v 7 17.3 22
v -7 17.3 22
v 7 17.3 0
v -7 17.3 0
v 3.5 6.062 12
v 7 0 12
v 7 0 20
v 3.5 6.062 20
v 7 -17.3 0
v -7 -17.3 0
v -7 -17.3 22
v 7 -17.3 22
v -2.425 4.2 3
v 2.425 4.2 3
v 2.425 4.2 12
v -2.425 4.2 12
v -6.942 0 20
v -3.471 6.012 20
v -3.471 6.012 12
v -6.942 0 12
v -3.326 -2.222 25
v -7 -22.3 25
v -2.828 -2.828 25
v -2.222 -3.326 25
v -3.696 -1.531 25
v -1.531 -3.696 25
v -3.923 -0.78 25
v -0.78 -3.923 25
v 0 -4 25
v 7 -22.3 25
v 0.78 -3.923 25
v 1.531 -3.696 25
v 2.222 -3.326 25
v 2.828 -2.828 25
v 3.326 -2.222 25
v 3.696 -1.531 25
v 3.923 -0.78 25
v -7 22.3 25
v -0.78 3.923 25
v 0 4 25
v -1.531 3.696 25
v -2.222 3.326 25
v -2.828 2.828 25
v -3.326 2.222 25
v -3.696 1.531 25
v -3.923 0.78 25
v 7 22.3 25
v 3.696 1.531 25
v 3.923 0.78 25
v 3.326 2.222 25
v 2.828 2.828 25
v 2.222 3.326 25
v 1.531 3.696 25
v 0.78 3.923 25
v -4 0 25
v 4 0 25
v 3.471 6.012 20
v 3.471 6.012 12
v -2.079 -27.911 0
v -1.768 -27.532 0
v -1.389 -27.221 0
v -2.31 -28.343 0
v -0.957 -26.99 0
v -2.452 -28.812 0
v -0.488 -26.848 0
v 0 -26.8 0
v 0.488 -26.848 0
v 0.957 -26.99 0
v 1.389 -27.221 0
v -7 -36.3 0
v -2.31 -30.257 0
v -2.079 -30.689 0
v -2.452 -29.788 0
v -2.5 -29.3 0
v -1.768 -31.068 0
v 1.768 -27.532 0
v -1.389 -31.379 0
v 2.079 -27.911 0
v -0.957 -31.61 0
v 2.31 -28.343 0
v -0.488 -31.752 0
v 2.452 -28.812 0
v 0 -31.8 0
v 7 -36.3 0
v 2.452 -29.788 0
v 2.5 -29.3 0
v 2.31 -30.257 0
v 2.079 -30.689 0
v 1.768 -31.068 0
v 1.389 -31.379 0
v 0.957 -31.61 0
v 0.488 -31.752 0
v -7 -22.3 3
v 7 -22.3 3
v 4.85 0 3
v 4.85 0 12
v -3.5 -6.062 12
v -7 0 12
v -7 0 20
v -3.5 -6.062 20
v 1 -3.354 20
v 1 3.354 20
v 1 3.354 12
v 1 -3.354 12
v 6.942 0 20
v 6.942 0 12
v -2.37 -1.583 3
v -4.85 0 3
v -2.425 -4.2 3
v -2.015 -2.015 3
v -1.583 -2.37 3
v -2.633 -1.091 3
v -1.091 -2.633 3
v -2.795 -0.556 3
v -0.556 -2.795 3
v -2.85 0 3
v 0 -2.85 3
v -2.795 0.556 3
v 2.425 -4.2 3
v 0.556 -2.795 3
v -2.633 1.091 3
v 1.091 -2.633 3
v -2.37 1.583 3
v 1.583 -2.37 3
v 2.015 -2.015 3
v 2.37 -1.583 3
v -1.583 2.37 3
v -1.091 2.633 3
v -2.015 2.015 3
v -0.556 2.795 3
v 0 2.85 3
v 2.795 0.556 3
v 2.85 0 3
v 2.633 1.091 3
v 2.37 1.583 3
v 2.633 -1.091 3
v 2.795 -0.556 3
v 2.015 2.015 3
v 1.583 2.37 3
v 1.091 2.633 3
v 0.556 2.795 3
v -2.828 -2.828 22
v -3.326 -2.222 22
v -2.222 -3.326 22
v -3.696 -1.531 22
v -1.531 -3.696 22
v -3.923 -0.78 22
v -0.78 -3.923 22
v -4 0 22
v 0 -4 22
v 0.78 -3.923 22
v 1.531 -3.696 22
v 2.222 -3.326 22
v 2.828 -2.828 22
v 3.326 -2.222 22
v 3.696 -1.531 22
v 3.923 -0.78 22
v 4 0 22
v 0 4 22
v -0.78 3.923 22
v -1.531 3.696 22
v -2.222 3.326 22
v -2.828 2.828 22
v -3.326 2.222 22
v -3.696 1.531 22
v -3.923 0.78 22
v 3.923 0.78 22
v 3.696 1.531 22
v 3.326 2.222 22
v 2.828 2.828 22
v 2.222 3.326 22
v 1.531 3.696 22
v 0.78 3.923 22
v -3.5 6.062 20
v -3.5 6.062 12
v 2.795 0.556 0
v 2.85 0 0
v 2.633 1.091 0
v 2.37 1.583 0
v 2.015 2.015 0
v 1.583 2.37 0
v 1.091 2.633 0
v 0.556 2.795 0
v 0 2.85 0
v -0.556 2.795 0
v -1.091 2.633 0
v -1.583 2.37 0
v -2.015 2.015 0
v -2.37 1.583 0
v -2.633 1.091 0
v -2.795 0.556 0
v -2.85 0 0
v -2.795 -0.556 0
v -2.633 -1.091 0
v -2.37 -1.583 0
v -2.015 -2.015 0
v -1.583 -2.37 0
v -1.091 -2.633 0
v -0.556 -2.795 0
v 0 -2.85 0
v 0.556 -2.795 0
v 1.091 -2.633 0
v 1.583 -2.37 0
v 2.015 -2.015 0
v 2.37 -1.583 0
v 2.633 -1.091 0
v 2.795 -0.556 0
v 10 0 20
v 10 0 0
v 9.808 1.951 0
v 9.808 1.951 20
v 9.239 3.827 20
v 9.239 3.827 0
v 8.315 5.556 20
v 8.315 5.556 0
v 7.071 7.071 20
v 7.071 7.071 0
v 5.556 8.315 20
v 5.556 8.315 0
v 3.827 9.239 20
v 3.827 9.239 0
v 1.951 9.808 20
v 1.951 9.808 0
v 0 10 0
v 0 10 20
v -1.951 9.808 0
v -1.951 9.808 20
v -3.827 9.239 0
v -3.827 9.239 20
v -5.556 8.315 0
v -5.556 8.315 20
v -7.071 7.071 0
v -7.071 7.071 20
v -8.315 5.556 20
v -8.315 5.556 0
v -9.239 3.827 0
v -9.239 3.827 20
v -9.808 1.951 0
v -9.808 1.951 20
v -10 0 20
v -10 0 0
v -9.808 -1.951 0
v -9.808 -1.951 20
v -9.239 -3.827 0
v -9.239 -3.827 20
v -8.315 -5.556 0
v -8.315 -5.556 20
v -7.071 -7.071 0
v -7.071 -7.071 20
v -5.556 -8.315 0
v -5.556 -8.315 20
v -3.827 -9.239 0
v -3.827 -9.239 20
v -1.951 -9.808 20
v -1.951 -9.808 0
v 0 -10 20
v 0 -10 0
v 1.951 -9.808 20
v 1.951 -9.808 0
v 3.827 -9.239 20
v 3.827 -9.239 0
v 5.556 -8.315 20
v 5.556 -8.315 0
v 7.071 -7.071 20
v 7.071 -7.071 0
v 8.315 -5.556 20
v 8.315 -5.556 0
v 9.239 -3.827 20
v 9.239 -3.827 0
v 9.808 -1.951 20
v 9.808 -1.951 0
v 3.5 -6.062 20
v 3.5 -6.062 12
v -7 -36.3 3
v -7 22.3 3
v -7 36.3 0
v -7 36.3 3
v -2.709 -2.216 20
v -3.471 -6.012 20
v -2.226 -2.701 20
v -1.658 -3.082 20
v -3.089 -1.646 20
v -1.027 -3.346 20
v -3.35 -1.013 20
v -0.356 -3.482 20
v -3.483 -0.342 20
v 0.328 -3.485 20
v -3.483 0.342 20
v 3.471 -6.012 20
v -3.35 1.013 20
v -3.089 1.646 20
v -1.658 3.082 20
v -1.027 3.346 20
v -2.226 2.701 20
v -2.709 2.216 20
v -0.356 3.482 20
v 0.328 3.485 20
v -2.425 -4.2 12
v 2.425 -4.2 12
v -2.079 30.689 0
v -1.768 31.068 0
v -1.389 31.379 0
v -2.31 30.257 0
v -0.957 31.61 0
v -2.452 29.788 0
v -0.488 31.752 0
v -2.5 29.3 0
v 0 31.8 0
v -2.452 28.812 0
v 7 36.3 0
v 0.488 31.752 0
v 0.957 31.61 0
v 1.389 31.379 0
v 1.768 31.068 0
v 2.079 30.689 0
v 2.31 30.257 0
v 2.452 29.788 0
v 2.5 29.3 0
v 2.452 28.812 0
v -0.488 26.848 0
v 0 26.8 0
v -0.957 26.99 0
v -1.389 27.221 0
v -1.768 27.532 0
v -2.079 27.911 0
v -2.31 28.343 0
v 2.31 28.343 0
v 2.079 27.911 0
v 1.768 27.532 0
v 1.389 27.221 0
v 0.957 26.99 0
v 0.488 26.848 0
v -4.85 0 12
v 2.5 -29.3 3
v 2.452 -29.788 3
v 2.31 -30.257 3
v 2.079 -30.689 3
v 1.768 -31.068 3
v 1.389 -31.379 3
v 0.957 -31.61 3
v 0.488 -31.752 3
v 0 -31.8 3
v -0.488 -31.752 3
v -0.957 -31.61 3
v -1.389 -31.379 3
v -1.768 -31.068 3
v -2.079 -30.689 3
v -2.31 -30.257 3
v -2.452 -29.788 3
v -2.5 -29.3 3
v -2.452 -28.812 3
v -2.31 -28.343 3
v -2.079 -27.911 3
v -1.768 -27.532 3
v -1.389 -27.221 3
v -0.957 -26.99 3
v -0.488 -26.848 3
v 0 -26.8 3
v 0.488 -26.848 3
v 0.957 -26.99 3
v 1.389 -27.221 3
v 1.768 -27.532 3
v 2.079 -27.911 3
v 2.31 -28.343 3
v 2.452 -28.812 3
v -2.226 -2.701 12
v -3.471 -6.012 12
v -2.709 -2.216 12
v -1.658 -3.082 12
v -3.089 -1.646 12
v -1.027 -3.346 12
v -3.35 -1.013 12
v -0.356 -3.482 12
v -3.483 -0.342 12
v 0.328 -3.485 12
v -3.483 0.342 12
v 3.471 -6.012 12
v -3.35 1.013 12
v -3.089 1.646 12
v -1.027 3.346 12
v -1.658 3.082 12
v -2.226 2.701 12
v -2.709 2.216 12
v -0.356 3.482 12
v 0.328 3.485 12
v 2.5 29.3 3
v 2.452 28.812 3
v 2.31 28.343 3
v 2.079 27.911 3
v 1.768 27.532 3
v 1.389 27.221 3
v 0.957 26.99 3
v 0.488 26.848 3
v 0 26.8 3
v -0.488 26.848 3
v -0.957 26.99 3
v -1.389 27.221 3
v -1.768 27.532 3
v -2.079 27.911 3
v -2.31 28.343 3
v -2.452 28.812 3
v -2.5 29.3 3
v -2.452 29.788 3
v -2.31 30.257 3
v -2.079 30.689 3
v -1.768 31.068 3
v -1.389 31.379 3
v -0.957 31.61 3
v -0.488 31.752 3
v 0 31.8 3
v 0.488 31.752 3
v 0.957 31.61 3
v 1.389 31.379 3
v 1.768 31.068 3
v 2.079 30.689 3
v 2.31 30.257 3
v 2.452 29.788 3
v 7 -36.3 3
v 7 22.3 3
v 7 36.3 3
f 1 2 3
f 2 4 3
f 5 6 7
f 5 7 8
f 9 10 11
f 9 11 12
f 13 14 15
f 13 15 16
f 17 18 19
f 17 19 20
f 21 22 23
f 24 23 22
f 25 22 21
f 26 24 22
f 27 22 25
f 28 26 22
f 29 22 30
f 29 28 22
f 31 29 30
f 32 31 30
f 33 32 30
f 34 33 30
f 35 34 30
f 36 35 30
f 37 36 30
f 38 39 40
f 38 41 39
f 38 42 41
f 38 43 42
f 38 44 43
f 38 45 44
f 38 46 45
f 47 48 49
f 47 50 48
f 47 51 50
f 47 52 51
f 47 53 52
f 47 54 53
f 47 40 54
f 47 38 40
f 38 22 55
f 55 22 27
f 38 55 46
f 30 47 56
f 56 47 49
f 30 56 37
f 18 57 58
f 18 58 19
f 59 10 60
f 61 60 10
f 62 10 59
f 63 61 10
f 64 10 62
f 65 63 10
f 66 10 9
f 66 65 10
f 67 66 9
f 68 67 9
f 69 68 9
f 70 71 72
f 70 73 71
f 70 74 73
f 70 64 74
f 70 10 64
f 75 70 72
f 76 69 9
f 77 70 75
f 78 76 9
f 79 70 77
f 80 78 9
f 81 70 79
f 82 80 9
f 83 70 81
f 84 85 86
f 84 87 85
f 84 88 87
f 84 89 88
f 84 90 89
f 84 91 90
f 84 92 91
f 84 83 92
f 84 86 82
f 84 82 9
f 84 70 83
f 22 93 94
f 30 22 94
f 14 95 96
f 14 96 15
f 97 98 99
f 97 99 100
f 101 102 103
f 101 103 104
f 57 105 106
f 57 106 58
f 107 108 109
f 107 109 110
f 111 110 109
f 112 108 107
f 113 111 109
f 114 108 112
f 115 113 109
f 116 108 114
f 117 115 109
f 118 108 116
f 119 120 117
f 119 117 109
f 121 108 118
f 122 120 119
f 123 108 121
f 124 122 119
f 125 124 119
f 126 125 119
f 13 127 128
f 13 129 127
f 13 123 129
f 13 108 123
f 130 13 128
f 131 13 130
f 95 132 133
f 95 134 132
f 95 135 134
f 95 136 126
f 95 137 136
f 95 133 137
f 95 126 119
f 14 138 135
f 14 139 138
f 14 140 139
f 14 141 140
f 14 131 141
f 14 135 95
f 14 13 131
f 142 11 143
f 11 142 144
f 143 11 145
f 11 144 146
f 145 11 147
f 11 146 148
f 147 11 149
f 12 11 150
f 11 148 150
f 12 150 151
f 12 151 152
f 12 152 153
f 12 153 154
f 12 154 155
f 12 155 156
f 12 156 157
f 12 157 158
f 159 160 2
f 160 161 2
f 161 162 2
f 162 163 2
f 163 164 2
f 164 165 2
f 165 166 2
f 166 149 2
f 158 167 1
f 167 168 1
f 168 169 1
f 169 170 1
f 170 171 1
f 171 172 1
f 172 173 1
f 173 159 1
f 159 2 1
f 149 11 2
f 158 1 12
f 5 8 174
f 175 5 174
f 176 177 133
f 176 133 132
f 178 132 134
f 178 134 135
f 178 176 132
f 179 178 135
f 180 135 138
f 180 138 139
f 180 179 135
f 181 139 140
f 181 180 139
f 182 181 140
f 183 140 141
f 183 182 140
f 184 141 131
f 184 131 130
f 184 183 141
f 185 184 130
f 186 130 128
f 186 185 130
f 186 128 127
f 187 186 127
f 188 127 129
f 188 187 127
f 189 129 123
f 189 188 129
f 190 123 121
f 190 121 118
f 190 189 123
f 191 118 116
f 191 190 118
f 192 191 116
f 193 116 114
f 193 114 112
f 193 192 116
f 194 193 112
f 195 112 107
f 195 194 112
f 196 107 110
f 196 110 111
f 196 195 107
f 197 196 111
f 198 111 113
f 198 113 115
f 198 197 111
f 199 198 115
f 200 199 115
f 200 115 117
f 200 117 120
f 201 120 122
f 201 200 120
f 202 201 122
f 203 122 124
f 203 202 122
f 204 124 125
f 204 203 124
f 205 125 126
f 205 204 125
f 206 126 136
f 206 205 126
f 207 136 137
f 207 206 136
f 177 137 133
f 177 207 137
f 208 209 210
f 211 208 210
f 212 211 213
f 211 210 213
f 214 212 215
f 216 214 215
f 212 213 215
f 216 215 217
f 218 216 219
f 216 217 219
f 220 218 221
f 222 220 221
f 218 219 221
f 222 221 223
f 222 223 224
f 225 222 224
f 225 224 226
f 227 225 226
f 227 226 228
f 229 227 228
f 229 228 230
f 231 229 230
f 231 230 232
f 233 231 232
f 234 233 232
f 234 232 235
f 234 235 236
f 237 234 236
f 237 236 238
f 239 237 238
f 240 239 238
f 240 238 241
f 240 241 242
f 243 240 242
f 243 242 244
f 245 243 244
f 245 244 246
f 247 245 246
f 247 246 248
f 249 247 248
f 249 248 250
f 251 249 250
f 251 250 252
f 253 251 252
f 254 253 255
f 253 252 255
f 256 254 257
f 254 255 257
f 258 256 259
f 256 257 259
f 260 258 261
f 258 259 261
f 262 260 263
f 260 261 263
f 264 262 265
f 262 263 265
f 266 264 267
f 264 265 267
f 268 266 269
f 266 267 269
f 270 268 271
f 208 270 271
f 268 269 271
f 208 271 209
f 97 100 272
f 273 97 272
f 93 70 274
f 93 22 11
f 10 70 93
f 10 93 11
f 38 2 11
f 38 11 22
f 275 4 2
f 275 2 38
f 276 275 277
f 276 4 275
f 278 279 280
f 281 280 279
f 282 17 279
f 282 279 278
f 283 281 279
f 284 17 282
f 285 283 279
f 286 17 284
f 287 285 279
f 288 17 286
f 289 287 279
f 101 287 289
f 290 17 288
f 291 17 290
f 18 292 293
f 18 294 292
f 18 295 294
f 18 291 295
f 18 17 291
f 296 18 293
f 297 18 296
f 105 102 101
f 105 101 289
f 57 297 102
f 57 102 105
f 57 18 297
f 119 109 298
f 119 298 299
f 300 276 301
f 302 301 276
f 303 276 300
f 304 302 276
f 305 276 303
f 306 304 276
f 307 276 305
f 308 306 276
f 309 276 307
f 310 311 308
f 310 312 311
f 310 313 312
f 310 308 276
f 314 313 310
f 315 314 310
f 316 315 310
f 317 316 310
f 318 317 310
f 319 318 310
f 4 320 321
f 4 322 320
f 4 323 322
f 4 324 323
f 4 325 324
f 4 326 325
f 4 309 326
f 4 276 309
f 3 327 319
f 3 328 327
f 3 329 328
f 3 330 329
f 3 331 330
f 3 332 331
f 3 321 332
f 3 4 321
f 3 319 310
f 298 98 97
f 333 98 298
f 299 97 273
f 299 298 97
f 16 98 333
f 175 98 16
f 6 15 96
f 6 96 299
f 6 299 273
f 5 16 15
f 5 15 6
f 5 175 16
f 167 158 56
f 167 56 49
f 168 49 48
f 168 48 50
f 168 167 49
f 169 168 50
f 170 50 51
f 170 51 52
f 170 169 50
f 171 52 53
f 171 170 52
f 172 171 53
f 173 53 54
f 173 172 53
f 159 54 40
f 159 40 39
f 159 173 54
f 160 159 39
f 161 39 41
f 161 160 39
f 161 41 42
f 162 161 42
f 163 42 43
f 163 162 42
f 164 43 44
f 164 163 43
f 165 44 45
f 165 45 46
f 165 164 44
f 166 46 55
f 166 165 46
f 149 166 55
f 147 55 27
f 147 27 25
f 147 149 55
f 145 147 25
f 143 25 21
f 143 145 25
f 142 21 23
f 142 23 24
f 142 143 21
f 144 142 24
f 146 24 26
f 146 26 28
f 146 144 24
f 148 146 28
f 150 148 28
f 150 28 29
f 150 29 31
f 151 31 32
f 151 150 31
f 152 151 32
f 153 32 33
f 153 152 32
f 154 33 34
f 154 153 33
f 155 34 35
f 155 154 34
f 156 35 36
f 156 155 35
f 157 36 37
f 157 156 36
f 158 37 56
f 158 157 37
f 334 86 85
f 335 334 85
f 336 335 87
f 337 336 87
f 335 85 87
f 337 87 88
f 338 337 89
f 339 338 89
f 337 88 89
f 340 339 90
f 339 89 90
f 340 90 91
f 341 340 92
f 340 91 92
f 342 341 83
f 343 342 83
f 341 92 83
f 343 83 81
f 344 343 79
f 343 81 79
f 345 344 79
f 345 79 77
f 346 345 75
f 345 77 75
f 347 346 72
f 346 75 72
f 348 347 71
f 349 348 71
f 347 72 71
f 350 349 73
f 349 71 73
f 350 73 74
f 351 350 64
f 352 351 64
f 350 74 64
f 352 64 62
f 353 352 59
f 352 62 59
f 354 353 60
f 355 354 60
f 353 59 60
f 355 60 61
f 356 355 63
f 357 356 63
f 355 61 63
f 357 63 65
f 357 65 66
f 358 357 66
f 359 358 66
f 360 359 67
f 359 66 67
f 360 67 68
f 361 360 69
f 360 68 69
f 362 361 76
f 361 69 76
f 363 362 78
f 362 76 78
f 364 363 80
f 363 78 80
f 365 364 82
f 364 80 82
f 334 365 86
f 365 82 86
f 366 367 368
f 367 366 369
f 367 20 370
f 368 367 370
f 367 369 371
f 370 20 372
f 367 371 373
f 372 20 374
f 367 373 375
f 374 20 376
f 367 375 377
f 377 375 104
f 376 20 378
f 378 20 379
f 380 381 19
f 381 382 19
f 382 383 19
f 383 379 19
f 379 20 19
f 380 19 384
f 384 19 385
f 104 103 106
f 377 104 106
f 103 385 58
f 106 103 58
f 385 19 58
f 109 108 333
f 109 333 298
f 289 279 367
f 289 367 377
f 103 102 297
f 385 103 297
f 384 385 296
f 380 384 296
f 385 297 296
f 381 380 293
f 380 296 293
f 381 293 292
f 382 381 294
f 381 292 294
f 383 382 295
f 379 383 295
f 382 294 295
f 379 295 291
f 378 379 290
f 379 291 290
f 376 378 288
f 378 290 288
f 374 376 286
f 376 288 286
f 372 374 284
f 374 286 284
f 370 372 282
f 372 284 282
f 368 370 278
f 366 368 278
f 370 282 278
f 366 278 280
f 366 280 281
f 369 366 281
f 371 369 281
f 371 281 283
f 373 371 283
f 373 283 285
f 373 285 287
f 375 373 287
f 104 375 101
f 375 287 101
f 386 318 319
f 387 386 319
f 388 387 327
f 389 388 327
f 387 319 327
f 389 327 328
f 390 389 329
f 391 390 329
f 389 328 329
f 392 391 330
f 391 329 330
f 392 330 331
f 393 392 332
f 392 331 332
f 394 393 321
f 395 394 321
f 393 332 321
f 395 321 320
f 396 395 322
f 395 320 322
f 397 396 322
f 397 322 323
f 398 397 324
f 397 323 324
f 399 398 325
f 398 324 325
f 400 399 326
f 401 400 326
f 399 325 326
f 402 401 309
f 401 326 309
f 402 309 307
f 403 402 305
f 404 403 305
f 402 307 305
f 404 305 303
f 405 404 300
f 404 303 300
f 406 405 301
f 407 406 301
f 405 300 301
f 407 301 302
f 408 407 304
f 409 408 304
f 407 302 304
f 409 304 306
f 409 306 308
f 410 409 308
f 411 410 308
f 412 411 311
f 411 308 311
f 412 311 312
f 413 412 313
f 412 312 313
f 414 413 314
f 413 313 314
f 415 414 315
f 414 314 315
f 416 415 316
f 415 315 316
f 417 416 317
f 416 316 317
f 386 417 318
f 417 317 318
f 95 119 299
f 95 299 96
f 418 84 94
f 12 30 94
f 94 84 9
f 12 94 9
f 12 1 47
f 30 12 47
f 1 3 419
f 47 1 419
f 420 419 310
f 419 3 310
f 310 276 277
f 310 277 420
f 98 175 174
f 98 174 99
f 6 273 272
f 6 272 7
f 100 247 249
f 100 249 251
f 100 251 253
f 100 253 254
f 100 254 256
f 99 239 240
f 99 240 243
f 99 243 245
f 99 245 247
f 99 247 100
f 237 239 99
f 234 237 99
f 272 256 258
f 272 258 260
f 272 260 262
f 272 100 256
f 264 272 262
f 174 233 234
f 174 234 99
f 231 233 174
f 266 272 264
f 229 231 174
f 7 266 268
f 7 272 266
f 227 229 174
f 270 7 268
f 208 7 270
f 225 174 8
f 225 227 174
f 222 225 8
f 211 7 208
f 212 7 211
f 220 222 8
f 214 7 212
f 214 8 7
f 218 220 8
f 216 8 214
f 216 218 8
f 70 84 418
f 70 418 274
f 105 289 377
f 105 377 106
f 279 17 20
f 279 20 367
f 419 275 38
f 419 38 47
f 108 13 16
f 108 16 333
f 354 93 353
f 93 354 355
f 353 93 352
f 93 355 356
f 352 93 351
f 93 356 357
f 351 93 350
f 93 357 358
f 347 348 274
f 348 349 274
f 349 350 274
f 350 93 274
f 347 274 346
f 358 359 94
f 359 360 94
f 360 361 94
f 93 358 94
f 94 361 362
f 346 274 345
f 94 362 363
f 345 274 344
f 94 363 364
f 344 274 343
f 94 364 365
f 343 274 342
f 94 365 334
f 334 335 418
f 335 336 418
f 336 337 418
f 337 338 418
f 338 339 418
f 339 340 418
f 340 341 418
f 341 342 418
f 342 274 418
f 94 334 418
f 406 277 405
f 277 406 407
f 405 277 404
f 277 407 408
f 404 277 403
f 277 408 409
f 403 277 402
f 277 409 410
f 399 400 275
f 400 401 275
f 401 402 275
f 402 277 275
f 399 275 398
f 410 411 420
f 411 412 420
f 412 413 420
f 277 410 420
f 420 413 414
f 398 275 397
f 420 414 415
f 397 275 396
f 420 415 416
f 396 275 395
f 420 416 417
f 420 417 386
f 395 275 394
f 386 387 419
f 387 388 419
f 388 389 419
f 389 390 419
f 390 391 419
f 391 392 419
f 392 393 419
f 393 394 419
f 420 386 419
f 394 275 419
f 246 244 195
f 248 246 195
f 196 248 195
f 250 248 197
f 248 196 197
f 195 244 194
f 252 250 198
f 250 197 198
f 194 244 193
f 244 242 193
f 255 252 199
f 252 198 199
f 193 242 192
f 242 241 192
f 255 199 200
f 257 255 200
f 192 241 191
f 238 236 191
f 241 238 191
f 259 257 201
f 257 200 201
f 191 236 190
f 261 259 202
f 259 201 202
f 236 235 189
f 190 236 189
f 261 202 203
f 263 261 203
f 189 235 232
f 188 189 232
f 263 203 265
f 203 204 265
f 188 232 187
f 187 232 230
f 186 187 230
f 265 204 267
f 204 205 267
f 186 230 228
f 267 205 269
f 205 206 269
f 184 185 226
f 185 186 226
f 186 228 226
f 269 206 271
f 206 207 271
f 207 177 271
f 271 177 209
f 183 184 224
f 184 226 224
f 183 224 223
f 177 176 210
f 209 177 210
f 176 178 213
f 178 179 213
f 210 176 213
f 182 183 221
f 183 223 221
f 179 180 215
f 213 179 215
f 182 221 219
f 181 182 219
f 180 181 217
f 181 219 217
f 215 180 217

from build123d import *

# Parameters (mm, degrees)
SKETCH004_R      = 2.5
EXTRUDE003_DEPTH = 3
SKETCH005_W      = 14
SKETCH005_H      = 5
EXTRUDE004_DEPTH = 19
SKETCH006_W      = 14
SKETCH006_H      = 44.6
SKETCH006_R      = 4
EXTRUDE005_DEPTH = 3
SKETCH001_R      = 10
EXTRUDE001_DEPTH = 9
SKETCH_R         = 10
SKETCH_R_2       = 2.85
EXTRUDE_DEPTH    = 3
SKETCH007_R      = 10
EXTRUDE006_DEPTH = 8
EXTRUDE007_DEPTH = 8


with BuildPart() as p3base:
    # Sketch004 → Extrude003 (new body)
    with BuildSketch(Plane(origin=(0, 0, 0), x_dir=(1, 0, 0), z_dir=(0, 0, -1))):
        Polygon((7, 36.3), (-7, 36.3), (-7, 22.3), (-7, 17.3), (7, 17.3), (7, 22.3), align=None)
        with Locations((0, 29.3)):
            Circle(SKETCH004_R, mode=Mode.SUBTRACT)
        Polygon((7, -36.3), (7, -22.3), (7, -17.3), (-7, -17.3), (-7, -22.3), (-7, -36.3), align=None)
        with Locations((0, -29.3)):
            Circle(SKETCH004_R, mode=Mode.SUBTRACT)
    extrude(amount=-EXTRUDE003_DEPTH)


with BuildPart() as p3walls:
    # Sketch005 (on Face17 of Extrude003) → Extrude004 (new body)
    with BuildSketch(Plane.XY.offset(3)):
        with Locations((0, 19.8)):
            Rectangle(SKETCH005_W, SKETCH005_H)
        with Locations((0, -19.8)):
            Rectangle(SKETCH005_W, SKETCH005_H)
    extrude(amount=EXTRUDE004_DEPTH)


with BuildPart() as p3:
    # Sketch006 (on Face6 of Extrude004) → Extrude005 (new body)
    with BuildSketch(Plane.XY.offset(22)):
        Rectangle(SKETCH006_W, SKETCH006_H)
        Circle(SKETCH006_R, mode=Mode.SUBTRACT)
    extrude(amount=EXTRUDE005_DEPTH)

    # Fusion001: union P3Base, P3Walls
    add(p3base.part)
    add(p3walls.part)


with BuildPart() as p1hexcylinder:
    # Sketch001 (on Face4 of Extrude) → Extrude001 (new body)
    with BuildSketch(Plane.XY.offset(3)):
        Circle(SKETCH001_R)
        Polygon((2.424871, 4.2), (-2.424871, 4.2), (-4.849742, 0), (-2.424871, -4.2), (2.424871, -4.2), (4.849742, 0), align=None, mode=Mode.SUBTRACT)
    extrude(amount=EXTRUDE001_DEPTH)


with BuildPart() as p1base:
    # Sketch → Extrude (new body)
    with BuildSketch(Plane.XY):
        Circle(SKETCH_R)
        Circle(SKETCH_R_2, mode=Mode.SUBTRACT)
    extrude(amount=EXTRUDE_DEPTH)


with BuildPart() as p1:
    # Sketch007 → Extrude006 (new body)
    with BuildSketch(Plane.XY.offset(12)):
        Circle(SKETCH007_R)
        Polygon((3.5, 6.062178), (-3.5, 6.062178), (-7, 0), (-3.5, -6.062178), (3.5, -6.062178), (7, 0), align=None, mode=Mode.SUBTRACT)
    extrude(amount=EXTRUDE006_DEPTH)

    # Fusion: union P1HexCylinder, P1Base
    add(p1hexcylinder.part)
    add(p1base.part)


with BuildPart() as p2:
    # Sketch008 (on Face3 of Fusion) → Extrude007 (new body)
    with BuildSketch(Plane.XY.offset(20)):
        Polygon((3.471132, 6.012178), (-3.471132, 6.012178), (-6.942265, 0), (-3.471132, -6.012178), (3.471132, -6.012178), (6.942265, 0), align=None)
        with BuildLine():
            Line((1, 3.354102), (1, -3.354102))
            ThreePointArc((1, 3.354102), (-3.5, 0), (1, -3.354102))
        make_face(mode=Mode.SUBTRACT)
    extrude(amount=-EXTRUDE007_DEPTH)


solid = Compound([p3.part, p1.part, p2.part])
